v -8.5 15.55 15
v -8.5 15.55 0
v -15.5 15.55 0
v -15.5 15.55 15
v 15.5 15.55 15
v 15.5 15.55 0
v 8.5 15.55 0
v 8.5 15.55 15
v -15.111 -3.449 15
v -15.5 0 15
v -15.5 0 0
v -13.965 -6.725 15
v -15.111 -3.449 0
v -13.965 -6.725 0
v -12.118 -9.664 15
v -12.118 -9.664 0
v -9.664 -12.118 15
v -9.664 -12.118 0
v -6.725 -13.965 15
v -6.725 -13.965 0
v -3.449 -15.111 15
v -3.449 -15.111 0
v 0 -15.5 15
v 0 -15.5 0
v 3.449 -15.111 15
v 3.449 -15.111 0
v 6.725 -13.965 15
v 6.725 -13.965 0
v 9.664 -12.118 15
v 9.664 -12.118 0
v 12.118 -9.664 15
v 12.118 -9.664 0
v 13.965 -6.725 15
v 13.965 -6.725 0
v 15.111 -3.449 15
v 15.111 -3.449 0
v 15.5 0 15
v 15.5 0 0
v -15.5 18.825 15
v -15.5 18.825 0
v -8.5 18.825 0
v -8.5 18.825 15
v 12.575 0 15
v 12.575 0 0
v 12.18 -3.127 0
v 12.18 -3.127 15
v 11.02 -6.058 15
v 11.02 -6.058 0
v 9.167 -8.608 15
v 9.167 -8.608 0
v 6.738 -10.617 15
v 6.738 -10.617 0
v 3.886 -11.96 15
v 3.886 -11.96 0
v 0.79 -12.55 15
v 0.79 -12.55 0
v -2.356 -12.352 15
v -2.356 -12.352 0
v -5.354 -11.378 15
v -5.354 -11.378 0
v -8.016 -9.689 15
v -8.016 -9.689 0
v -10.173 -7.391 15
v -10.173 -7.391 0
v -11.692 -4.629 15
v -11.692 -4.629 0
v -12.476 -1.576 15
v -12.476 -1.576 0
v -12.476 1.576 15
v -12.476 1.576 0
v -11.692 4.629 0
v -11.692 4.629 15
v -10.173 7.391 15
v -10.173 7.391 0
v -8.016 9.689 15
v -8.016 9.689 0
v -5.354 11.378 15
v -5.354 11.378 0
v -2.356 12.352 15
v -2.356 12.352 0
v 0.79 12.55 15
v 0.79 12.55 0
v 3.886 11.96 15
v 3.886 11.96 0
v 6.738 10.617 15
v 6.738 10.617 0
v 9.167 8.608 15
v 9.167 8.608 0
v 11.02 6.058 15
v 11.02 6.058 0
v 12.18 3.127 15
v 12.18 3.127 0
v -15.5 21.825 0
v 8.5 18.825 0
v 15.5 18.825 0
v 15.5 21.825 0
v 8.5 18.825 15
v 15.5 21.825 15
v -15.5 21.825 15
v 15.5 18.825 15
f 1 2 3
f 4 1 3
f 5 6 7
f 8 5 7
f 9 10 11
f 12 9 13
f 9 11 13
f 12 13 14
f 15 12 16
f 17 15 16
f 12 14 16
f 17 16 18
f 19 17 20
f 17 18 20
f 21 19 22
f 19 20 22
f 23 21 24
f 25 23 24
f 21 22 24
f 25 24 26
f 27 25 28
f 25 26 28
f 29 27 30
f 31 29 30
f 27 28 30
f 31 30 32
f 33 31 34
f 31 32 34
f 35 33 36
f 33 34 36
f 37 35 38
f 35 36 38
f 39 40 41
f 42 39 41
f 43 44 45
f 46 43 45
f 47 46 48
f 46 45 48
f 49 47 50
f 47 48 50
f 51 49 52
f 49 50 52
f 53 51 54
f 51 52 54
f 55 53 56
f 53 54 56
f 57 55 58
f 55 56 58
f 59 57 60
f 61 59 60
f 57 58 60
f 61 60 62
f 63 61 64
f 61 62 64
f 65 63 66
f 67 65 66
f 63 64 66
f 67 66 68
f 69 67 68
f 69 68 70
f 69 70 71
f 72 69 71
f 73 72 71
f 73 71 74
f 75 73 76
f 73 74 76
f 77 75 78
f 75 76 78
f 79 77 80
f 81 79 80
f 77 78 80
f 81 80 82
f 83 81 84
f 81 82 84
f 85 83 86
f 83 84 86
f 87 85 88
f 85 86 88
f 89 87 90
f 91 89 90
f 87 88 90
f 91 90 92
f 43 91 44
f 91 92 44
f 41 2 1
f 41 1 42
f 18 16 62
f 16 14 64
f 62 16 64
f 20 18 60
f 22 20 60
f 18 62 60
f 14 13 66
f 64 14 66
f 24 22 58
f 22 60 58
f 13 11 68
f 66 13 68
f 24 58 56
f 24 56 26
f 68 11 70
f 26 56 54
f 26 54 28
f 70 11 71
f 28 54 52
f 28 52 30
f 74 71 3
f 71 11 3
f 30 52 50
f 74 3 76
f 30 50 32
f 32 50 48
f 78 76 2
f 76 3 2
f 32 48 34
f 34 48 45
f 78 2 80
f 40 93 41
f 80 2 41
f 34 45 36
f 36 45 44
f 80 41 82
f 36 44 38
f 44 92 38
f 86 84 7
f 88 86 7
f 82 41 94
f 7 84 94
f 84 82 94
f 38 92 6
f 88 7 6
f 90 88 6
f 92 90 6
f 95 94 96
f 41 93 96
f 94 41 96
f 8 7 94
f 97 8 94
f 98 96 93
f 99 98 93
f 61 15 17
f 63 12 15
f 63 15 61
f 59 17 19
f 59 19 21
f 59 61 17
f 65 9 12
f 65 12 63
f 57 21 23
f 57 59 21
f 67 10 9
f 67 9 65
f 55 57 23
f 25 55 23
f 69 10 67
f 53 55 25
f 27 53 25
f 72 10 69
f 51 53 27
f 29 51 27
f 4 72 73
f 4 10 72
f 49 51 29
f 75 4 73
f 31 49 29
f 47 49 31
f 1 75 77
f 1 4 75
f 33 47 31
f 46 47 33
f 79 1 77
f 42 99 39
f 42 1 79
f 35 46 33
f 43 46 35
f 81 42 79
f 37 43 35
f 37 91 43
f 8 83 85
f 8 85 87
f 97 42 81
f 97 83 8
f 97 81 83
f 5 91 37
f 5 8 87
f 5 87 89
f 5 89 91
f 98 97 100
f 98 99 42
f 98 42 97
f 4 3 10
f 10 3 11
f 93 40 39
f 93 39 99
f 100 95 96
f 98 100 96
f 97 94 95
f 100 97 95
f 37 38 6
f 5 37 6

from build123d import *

# Parameters (mm, degrees)
SKETCH1_W           = 7
SKETCH1_H           = 3
SKETCH1_W_2         = 17
SKETCH1_H_2         = 3.275
BOSS_EXTRUDE1_DEPTH = 15


with BuildPart() as part:
    # Sketch1 → Boss-Extrude1 (new body)
    with BuildSketch(Plane.XY):
        with Locations((12, 20.325)):
            Rectangle(SKETCH1_W, SKETCH1_H)
        with Locations((0, 20.325)):
            Rectangle(SKETCH1_W_2, SKETCH1_H)
        with Locations((-12, 20.325)):
            Rectangle(SKETCH1_W, SKETCH1_H)
        with Locations((0, 17.1875)):
            Rectangle(SKETCH1_W_2, SKETCH1_H_2)
        with BuildLine():
            ThreePointArc((-15.5, 0), (0, 15.5), (15.5, 0))
            Line((15.5, 0), (15.5, 15.55))
            Line((15.5, 15.55), (8.5, 15.55))
            Line((8.5, 15.55), (-8.5, 15.55))
            Line((-8.5, 15.55), (-15.5, 15.55))
            Line((-15.5, 15.55), (-15.5, 0))
        make_face()
        with BuildLine():
            ThreePointArc((-12.575, 0), (0, 12.575), (12.575, 0))
            Line((12.575, 0), (15.5, 0))
            ThreePointArc((15.5, 0), (0, 15.5), (-15.5, 0))
            Line((-15.5, 0), (-12.575, 0))
        make_face()
        with BuildLine():
            Line((15.5, 0), (12.575, 0))
            ThreePointArc((12.575, 0), (0, -12.575), (-12.575, 0))
            Line((-12.575, 0), (-15.5, 0))
            ThreePointArc((-15.5, 0), (0, -15.5), (15.5, 0))
        make_face()
    extrude(amount=BOSS_EXTRUDE1_DEPTH)


solid = part.part
